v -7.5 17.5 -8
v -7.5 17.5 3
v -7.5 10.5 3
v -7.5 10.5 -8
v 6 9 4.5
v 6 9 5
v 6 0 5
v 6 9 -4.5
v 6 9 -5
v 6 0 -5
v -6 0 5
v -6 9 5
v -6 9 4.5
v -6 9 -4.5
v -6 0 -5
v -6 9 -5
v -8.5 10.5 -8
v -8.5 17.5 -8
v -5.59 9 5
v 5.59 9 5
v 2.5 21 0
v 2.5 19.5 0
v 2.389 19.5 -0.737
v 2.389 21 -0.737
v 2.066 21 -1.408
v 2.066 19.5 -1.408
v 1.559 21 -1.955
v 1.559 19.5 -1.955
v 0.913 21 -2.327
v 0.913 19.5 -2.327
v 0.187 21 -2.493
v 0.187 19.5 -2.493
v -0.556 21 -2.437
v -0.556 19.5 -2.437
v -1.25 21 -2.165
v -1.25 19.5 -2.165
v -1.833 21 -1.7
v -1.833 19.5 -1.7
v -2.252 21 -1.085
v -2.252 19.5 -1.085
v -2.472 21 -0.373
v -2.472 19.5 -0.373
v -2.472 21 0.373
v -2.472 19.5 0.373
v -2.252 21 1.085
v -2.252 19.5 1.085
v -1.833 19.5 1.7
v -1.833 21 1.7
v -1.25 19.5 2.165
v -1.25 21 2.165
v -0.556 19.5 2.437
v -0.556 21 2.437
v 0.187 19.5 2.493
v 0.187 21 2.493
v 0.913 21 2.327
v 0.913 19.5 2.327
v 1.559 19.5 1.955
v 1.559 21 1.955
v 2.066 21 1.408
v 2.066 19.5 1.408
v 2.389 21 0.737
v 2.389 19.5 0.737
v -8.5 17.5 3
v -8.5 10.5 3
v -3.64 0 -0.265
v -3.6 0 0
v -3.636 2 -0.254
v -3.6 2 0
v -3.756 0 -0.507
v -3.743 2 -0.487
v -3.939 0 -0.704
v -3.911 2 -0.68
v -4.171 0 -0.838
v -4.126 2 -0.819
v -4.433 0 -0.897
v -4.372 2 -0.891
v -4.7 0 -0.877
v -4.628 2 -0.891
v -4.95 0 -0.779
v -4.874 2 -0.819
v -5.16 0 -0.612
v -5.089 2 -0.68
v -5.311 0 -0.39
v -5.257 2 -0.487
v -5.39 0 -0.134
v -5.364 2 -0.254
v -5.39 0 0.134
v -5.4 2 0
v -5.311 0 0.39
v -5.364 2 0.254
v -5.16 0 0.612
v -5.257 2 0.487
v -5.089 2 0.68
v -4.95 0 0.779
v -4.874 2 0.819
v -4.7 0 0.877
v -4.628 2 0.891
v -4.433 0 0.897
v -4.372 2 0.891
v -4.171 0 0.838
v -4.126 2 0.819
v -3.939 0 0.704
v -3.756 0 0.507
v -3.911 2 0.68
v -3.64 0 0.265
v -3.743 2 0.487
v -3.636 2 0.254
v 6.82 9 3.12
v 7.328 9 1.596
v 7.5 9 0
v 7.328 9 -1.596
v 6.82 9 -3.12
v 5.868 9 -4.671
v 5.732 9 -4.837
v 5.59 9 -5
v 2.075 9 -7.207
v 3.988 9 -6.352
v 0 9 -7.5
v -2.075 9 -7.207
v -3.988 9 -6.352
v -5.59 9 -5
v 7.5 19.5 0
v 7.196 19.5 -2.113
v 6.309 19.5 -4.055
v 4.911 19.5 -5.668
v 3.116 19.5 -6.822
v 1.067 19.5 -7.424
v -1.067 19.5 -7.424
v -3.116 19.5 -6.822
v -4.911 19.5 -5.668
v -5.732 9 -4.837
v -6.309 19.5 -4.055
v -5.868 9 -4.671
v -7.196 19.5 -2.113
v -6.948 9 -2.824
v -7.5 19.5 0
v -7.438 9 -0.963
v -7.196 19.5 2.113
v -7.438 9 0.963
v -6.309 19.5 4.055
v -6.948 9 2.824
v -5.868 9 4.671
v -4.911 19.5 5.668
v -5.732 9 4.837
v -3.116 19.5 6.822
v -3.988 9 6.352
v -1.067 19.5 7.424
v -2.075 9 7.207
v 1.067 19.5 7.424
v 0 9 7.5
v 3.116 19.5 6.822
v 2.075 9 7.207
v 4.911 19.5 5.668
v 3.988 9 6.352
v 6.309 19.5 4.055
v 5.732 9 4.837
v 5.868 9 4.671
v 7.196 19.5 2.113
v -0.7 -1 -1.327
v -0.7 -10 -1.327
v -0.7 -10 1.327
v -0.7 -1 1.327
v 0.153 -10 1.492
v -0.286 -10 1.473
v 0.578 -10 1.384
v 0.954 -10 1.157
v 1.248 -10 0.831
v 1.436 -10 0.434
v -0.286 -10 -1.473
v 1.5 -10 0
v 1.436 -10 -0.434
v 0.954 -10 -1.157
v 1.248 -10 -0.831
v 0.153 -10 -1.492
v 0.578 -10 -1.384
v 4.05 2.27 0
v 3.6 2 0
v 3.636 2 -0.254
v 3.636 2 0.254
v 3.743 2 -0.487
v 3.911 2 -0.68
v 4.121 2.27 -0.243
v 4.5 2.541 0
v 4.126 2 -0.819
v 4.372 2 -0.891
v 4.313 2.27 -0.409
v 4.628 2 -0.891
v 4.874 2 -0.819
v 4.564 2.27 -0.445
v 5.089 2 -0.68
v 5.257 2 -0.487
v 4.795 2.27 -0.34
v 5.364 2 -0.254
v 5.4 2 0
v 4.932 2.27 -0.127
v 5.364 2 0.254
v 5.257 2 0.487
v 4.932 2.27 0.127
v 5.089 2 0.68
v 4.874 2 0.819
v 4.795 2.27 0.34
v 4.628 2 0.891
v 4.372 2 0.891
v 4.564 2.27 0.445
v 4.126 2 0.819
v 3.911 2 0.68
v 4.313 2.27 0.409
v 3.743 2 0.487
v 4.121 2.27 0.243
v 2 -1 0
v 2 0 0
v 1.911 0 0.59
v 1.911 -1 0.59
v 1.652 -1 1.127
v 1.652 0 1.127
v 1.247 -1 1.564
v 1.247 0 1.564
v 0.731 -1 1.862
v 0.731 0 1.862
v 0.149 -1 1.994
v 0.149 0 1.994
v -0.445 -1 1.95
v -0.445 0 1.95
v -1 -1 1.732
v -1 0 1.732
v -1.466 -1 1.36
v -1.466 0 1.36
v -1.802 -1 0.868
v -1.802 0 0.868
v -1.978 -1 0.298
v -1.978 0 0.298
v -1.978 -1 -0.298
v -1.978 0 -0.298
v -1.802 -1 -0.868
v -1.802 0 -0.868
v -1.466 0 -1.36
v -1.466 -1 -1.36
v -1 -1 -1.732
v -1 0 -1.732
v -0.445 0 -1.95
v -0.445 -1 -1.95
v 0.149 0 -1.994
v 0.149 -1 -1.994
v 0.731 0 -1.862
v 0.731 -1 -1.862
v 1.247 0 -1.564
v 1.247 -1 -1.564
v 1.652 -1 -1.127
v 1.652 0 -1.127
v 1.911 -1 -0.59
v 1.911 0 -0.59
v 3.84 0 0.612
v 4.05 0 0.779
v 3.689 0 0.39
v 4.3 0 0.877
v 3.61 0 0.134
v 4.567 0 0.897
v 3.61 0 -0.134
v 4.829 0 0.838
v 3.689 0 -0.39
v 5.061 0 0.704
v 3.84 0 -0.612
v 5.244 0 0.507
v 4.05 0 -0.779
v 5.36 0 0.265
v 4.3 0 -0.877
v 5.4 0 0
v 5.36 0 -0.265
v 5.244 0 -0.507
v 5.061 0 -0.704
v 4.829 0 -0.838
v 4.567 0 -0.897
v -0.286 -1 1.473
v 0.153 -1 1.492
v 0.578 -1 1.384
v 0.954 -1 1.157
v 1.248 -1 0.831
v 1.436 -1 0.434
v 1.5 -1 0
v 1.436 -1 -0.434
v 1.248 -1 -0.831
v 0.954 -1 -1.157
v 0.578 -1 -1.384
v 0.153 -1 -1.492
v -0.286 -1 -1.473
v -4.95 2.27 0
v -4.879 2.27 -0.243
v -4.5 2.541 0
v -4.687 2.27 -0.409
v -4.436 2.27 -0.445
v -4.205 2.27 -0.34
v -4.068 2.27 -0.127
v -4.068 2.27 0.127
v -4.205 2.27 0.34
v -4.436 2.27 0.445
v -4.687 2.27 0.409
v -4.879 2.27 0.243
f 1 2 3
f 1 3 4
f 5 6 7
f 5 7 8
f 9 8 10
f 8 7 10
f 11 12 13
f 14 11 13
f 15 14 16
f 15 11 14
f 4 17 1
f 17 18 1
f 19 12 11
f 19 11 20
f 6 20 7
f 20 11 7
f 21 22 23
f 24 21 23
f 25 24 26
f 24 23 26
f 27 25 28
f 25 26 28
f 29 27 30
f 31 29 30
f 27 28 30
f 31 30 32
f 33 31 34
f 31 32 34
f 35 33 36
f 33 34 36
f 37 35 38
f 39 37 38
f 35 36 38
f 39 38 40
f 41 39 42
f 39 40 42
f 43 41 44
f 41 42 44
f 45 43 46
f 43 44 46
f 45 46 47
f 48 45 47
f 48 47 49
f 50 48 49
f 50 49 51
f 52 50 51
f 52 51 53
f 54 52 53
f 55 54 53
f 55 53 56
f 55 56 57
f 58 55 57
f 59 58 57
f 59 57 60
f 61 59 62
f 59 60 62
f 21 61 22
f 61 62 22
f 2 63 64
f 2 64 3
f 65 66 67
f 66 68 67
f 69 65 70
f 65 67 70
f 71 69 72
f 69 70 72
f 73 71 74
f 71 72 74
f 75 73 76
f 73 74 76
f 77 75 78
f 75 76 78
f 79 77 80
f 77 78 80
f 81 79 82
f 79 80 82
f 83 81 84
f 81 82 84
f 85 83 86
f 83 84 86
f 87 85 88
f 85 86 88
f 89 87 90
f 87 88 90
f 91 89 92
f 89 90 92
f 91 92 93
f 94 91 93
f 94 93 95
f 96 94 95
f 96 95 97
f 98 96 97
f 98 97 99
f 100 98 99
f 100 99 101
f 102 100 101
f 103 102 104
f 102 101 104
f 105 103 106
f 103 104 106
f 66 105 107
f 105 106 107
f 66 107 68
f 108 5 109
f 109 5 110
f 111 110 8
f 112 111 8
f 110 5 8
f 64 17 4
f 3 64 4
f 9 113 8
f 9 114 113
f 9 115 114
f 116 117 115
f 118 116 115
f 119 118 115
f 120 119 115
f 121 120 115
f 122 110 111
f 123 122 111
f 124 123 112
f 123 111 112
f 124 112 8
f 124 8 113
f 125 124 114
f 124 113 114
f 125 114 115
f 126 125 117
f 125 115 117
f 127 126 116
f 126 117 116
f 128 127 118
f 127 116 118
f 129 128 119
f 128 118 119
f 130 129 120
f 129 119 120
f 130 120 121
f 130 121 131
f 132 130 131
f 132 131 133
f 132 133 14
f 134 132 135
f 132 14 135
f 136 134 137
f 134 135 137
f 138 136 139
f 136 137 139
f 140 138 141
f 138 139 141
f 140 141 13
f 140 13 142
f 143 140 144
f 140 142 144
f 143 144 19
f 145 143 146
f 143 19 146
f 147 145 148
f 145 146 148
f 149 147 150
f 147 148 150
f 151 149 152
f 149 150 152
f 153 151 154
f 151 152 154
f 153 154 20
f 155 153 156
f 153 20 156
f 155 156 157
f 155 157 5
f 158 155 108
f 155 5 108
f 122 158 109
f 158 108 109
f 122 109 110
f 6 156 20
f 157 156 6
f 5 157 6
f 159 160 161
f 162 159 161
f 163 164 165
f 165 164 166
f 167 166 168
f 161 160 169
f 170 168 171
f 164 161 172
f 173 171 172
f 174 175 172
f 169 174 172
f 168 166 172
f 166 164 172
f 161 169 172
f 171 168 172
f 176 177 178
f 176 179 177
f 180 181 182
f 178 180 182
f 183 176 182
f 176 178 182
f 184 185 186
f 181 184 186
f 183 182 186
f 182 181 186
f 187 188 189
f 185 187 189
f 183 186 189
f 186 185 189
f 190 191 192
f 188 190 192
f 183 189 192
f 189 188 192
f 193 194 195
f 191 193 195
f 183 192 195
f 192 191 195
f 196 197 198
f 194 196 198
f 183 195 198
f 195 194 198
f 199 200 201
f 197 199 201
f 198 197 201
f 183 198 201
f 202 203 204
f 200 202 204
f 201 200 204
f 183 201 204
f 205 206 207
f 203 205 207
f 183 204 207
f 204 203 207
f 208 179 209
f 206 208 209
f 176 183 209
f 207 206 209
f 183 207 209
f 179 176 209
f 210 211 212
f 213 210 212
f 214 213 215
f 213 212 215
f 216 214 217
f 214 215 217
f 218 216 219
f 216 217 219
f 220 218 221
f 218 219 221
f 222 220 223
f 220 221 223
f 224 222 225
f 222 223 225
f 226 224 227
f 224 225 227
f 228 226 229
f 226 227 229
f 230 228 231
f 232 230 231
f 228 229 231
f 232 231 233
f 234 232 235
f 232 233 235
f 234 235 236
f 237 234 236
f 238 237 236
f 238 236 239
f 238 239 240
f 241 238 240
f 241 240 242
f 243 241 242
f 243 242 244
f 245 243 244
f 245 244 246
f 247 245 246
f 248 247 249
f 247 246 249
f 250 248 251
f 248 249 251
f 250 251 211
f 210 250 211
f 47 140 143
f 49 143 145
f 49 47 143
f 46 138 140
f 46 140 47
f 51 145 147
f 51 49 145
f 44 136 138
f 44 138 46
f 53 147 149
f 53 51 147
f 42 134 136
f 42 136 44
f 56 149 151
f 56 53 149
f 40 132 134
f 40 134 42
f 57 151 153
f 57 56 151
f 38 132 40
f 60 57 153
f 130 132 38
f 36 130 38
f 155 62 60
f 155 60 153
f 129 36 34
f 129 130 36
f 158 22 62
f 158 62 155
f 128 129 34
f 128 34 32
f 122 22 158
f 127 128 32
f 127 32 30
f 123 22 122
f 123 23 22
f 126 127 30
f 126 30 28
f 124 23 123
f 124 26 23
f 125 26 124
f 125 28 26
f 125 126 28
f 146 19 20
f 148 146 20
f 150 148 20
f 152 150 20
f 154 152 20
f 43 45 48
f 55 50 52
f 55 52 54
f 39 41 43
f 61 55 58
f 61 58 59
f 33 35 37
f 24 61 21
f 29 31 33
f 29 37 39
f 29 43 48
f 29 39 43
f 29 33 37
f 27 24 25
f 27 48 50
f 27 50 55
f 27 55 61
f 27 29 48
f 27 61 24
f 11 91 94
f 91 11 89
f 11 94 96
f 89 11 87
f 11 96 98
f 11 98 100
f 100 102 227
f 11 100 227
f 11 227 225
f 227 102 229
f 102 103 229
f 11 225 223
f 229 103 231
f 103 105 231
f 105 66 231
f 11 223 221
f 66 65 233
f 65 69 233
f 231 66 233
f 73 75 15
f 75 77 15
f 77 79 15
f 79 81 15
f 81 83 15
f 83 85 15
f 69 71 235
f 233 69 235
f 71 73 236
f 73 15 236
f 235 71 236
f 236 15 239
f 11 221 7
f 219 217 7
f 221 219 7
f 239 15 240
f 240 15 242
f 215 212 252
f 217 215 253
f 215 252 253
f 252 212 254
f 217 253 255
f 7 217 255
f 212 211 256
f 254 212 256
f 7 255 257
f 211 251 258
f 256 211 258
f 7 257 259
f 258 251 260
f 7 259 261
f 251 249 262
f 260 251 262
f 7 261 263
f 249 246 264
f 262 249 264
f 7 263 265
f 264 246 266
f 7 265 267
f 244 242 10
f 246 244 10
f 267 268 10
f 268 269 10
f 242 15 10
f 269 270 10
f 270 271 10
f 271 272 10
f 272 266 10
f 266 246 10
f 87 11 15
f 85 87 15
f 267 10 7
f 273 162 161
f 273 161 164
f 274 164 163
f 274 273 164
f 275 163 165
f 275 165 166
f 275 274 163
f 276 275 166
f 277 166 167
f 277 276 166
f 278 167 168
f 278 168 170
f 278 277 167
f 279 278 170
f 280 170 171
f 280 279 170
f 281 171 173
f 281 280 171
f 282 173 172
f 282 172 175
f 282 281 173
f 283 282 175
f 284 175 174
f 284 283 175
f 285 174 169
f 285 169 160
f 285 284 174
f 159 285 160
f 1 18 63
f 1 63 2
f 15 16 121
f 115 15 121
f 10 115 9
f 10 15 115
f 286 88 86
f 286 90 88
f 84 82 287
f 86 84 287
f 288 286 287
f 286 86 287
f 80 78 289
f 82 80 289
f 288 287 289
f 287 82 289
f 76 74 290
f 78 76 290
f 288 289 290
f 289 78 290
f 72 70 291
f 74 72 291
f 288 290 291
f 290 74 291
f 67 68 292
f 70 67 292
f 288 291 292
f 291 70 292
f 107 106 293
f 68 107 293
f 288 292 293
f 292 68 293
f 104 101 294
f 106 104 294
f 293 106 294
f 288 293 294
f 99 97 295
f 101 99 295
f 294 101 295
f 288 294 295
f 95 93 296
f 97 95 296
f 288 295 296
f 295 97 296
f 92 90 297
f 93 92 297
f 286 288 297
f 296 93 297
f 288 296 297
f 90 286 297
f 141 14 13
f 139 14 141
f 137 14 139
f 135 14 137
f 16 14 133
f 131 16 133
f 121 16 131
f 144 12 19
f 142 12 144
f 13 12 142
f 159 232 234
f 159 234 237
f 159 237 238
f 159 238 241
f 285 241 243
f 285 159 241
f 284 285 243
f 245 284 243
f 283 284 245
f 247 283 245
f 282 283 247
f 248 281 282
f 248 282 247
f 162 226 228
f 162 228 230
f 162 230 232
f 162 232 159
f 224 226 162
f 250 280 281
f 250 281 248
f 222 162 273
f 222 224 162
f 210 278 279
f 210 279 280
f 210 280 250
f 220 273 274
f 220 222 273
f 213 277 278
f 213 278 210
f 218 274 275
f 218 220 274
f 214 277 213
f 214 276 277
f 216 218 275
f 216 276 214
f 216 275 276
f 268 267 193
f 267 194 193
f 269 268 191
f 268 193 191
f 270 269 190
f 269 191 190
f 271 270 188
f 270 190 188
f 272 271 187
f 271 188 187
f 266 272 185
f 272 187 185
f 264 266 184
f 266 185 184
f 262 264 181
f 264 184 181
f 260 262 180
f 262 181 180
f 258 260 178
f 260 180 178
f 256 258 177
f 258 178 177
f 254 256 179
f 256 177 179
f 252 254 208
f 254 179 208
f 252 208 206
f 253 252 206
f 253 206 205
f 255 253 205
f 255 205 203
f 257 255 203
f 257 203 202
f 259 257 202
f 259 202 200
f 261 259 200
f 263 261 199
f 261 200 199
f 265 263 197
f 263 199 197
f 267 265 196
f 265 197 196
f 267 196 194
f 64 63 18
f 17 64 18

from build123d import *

# Parameters (mm, degrees)
SKETCH1_W                  = 12
SKETCH1_H                  = 10
BOSS_EXTRUDE1_DEPTH        = 9
SKETCH2_R                  = 2
BOSS_EXTRUDE2_DEPTH        = 1
BOSS_EXTRUDE3_DEPTH        = 9
M1_6_CLEARANCE_HOLE1_D     = 1.8
M1_6_CLEARANCE_HOLE1_DEPTH = 2
M1_6_CLEARANCE_HOLE1_TIP   = 0.540774557
SKETCH6_R                  = 7.5
BOSS_EXTRUDE4_DEPTH        = 10.5
SKETCH7_R                  = 2.5
BOSS_EXTRUDE5_DEPTH        = 1.5
SKETCH8_W                  = 1
SKETCH8_H                  = 11
BOSS_EXTRUDE6_DEPTH        = 3.5


with BuildPart() as part:
    # Sketch1 → Boss-Extrude1 (new body)
    with BuildSketch(Plane(origin=(0, 0, 0), x_dir=(1, 0, 0), z_dir=(0, 1, 0))):
        Rectangle(SKETCH1_W, SKETCH1_H)
    extrude(amount=BOSS_EXTRUDE1_DEPTH)

    # Sketch2 → Boss-Extrude2 (add)
    with BuildSketch(Plane.XZ):
        Circle(SKETCH2_R)
    extrude(amount=BOSS_EXTRUDE2_DEPTH)

    # Sketch3 → Boss-Extrude3 (add)
    with BuildSketch(Plane(origin=(0, -1, 0), x_dir=(-1, 0, 0), z_dir=(0, -1, 0))):
        with BuildLine():
            Line((0.7, 1.326649916), (0.7, -1.326649916))
            ThreePointArc((0.7, -1.326649916), (-1.5, 0), (0.7, 1.326649916))
        make_face()
    extrude(amount=BOSS_EXTRUDE3_DEPTH)

    # M1.6 Clearance Hole1
    with Locations(Plane(origin=(0, 0, 0), x_dir=(-1, 0, 0), z_dir=(0, -1, 0))):
        with Locations((4.5, 0), (-4.5, 0)):
            Hole(M1_6_CLEARANCE_HOLE1_D / 2, depth=M1_6_CLEARANCE_HOLE1_DEPTH)
            with Locations((0, 0, -(M1_6_CLEARANCE_HOLE1_DEPTH + M1_6_CLEARANCE_HOLE1_TIP / 2))):  # 118° drill point
                Cone(0, M1_6_CLEARANCE_HOLE1_D / 2, M1_6_CLEARANCE_HOLE1_TIP, mode=Mode.SUBTRACT)

    # Sketch6 → Boss-Extrude4 (add)
    with BuildSketch(Plane(origin=(0, 9, 0), x_dir=(1, 0, 0), z_dir=(0, 1, 0))):
        Circle(SKETCH6_R)
    extrude(amount=BOSS_EXTRUDE4_DEPTH)

    # Sketch7 → Boss-Extrude5 (add)
    with BuildSketch(Plane(origin=(0, 19.5, 0), x_dir=(1, 0, 0), z_dir=(0, 1, 0))):
        Circle(SKETCH7_R)
    extrude(amount=BOSS_EXTRUDE5_DEPTH)


with BuildPart() as body_2:
    # Sketch8 → Boss-Extrude6 (new body, symmetric)
    with BuildSketch(Plane(origin=(0, 14, 0), x_dir=(1, 0, 0), z_dir=(0, 1, 0))):
        with Locations((-8, 2.5)):
            Rectangle(SKETCH8_W, SKETCH8_H)
    extrude(amount=BOSS_EXTRUDE6_DEPTH, both=True)


solid = Compound([part.part, body_2.part])
